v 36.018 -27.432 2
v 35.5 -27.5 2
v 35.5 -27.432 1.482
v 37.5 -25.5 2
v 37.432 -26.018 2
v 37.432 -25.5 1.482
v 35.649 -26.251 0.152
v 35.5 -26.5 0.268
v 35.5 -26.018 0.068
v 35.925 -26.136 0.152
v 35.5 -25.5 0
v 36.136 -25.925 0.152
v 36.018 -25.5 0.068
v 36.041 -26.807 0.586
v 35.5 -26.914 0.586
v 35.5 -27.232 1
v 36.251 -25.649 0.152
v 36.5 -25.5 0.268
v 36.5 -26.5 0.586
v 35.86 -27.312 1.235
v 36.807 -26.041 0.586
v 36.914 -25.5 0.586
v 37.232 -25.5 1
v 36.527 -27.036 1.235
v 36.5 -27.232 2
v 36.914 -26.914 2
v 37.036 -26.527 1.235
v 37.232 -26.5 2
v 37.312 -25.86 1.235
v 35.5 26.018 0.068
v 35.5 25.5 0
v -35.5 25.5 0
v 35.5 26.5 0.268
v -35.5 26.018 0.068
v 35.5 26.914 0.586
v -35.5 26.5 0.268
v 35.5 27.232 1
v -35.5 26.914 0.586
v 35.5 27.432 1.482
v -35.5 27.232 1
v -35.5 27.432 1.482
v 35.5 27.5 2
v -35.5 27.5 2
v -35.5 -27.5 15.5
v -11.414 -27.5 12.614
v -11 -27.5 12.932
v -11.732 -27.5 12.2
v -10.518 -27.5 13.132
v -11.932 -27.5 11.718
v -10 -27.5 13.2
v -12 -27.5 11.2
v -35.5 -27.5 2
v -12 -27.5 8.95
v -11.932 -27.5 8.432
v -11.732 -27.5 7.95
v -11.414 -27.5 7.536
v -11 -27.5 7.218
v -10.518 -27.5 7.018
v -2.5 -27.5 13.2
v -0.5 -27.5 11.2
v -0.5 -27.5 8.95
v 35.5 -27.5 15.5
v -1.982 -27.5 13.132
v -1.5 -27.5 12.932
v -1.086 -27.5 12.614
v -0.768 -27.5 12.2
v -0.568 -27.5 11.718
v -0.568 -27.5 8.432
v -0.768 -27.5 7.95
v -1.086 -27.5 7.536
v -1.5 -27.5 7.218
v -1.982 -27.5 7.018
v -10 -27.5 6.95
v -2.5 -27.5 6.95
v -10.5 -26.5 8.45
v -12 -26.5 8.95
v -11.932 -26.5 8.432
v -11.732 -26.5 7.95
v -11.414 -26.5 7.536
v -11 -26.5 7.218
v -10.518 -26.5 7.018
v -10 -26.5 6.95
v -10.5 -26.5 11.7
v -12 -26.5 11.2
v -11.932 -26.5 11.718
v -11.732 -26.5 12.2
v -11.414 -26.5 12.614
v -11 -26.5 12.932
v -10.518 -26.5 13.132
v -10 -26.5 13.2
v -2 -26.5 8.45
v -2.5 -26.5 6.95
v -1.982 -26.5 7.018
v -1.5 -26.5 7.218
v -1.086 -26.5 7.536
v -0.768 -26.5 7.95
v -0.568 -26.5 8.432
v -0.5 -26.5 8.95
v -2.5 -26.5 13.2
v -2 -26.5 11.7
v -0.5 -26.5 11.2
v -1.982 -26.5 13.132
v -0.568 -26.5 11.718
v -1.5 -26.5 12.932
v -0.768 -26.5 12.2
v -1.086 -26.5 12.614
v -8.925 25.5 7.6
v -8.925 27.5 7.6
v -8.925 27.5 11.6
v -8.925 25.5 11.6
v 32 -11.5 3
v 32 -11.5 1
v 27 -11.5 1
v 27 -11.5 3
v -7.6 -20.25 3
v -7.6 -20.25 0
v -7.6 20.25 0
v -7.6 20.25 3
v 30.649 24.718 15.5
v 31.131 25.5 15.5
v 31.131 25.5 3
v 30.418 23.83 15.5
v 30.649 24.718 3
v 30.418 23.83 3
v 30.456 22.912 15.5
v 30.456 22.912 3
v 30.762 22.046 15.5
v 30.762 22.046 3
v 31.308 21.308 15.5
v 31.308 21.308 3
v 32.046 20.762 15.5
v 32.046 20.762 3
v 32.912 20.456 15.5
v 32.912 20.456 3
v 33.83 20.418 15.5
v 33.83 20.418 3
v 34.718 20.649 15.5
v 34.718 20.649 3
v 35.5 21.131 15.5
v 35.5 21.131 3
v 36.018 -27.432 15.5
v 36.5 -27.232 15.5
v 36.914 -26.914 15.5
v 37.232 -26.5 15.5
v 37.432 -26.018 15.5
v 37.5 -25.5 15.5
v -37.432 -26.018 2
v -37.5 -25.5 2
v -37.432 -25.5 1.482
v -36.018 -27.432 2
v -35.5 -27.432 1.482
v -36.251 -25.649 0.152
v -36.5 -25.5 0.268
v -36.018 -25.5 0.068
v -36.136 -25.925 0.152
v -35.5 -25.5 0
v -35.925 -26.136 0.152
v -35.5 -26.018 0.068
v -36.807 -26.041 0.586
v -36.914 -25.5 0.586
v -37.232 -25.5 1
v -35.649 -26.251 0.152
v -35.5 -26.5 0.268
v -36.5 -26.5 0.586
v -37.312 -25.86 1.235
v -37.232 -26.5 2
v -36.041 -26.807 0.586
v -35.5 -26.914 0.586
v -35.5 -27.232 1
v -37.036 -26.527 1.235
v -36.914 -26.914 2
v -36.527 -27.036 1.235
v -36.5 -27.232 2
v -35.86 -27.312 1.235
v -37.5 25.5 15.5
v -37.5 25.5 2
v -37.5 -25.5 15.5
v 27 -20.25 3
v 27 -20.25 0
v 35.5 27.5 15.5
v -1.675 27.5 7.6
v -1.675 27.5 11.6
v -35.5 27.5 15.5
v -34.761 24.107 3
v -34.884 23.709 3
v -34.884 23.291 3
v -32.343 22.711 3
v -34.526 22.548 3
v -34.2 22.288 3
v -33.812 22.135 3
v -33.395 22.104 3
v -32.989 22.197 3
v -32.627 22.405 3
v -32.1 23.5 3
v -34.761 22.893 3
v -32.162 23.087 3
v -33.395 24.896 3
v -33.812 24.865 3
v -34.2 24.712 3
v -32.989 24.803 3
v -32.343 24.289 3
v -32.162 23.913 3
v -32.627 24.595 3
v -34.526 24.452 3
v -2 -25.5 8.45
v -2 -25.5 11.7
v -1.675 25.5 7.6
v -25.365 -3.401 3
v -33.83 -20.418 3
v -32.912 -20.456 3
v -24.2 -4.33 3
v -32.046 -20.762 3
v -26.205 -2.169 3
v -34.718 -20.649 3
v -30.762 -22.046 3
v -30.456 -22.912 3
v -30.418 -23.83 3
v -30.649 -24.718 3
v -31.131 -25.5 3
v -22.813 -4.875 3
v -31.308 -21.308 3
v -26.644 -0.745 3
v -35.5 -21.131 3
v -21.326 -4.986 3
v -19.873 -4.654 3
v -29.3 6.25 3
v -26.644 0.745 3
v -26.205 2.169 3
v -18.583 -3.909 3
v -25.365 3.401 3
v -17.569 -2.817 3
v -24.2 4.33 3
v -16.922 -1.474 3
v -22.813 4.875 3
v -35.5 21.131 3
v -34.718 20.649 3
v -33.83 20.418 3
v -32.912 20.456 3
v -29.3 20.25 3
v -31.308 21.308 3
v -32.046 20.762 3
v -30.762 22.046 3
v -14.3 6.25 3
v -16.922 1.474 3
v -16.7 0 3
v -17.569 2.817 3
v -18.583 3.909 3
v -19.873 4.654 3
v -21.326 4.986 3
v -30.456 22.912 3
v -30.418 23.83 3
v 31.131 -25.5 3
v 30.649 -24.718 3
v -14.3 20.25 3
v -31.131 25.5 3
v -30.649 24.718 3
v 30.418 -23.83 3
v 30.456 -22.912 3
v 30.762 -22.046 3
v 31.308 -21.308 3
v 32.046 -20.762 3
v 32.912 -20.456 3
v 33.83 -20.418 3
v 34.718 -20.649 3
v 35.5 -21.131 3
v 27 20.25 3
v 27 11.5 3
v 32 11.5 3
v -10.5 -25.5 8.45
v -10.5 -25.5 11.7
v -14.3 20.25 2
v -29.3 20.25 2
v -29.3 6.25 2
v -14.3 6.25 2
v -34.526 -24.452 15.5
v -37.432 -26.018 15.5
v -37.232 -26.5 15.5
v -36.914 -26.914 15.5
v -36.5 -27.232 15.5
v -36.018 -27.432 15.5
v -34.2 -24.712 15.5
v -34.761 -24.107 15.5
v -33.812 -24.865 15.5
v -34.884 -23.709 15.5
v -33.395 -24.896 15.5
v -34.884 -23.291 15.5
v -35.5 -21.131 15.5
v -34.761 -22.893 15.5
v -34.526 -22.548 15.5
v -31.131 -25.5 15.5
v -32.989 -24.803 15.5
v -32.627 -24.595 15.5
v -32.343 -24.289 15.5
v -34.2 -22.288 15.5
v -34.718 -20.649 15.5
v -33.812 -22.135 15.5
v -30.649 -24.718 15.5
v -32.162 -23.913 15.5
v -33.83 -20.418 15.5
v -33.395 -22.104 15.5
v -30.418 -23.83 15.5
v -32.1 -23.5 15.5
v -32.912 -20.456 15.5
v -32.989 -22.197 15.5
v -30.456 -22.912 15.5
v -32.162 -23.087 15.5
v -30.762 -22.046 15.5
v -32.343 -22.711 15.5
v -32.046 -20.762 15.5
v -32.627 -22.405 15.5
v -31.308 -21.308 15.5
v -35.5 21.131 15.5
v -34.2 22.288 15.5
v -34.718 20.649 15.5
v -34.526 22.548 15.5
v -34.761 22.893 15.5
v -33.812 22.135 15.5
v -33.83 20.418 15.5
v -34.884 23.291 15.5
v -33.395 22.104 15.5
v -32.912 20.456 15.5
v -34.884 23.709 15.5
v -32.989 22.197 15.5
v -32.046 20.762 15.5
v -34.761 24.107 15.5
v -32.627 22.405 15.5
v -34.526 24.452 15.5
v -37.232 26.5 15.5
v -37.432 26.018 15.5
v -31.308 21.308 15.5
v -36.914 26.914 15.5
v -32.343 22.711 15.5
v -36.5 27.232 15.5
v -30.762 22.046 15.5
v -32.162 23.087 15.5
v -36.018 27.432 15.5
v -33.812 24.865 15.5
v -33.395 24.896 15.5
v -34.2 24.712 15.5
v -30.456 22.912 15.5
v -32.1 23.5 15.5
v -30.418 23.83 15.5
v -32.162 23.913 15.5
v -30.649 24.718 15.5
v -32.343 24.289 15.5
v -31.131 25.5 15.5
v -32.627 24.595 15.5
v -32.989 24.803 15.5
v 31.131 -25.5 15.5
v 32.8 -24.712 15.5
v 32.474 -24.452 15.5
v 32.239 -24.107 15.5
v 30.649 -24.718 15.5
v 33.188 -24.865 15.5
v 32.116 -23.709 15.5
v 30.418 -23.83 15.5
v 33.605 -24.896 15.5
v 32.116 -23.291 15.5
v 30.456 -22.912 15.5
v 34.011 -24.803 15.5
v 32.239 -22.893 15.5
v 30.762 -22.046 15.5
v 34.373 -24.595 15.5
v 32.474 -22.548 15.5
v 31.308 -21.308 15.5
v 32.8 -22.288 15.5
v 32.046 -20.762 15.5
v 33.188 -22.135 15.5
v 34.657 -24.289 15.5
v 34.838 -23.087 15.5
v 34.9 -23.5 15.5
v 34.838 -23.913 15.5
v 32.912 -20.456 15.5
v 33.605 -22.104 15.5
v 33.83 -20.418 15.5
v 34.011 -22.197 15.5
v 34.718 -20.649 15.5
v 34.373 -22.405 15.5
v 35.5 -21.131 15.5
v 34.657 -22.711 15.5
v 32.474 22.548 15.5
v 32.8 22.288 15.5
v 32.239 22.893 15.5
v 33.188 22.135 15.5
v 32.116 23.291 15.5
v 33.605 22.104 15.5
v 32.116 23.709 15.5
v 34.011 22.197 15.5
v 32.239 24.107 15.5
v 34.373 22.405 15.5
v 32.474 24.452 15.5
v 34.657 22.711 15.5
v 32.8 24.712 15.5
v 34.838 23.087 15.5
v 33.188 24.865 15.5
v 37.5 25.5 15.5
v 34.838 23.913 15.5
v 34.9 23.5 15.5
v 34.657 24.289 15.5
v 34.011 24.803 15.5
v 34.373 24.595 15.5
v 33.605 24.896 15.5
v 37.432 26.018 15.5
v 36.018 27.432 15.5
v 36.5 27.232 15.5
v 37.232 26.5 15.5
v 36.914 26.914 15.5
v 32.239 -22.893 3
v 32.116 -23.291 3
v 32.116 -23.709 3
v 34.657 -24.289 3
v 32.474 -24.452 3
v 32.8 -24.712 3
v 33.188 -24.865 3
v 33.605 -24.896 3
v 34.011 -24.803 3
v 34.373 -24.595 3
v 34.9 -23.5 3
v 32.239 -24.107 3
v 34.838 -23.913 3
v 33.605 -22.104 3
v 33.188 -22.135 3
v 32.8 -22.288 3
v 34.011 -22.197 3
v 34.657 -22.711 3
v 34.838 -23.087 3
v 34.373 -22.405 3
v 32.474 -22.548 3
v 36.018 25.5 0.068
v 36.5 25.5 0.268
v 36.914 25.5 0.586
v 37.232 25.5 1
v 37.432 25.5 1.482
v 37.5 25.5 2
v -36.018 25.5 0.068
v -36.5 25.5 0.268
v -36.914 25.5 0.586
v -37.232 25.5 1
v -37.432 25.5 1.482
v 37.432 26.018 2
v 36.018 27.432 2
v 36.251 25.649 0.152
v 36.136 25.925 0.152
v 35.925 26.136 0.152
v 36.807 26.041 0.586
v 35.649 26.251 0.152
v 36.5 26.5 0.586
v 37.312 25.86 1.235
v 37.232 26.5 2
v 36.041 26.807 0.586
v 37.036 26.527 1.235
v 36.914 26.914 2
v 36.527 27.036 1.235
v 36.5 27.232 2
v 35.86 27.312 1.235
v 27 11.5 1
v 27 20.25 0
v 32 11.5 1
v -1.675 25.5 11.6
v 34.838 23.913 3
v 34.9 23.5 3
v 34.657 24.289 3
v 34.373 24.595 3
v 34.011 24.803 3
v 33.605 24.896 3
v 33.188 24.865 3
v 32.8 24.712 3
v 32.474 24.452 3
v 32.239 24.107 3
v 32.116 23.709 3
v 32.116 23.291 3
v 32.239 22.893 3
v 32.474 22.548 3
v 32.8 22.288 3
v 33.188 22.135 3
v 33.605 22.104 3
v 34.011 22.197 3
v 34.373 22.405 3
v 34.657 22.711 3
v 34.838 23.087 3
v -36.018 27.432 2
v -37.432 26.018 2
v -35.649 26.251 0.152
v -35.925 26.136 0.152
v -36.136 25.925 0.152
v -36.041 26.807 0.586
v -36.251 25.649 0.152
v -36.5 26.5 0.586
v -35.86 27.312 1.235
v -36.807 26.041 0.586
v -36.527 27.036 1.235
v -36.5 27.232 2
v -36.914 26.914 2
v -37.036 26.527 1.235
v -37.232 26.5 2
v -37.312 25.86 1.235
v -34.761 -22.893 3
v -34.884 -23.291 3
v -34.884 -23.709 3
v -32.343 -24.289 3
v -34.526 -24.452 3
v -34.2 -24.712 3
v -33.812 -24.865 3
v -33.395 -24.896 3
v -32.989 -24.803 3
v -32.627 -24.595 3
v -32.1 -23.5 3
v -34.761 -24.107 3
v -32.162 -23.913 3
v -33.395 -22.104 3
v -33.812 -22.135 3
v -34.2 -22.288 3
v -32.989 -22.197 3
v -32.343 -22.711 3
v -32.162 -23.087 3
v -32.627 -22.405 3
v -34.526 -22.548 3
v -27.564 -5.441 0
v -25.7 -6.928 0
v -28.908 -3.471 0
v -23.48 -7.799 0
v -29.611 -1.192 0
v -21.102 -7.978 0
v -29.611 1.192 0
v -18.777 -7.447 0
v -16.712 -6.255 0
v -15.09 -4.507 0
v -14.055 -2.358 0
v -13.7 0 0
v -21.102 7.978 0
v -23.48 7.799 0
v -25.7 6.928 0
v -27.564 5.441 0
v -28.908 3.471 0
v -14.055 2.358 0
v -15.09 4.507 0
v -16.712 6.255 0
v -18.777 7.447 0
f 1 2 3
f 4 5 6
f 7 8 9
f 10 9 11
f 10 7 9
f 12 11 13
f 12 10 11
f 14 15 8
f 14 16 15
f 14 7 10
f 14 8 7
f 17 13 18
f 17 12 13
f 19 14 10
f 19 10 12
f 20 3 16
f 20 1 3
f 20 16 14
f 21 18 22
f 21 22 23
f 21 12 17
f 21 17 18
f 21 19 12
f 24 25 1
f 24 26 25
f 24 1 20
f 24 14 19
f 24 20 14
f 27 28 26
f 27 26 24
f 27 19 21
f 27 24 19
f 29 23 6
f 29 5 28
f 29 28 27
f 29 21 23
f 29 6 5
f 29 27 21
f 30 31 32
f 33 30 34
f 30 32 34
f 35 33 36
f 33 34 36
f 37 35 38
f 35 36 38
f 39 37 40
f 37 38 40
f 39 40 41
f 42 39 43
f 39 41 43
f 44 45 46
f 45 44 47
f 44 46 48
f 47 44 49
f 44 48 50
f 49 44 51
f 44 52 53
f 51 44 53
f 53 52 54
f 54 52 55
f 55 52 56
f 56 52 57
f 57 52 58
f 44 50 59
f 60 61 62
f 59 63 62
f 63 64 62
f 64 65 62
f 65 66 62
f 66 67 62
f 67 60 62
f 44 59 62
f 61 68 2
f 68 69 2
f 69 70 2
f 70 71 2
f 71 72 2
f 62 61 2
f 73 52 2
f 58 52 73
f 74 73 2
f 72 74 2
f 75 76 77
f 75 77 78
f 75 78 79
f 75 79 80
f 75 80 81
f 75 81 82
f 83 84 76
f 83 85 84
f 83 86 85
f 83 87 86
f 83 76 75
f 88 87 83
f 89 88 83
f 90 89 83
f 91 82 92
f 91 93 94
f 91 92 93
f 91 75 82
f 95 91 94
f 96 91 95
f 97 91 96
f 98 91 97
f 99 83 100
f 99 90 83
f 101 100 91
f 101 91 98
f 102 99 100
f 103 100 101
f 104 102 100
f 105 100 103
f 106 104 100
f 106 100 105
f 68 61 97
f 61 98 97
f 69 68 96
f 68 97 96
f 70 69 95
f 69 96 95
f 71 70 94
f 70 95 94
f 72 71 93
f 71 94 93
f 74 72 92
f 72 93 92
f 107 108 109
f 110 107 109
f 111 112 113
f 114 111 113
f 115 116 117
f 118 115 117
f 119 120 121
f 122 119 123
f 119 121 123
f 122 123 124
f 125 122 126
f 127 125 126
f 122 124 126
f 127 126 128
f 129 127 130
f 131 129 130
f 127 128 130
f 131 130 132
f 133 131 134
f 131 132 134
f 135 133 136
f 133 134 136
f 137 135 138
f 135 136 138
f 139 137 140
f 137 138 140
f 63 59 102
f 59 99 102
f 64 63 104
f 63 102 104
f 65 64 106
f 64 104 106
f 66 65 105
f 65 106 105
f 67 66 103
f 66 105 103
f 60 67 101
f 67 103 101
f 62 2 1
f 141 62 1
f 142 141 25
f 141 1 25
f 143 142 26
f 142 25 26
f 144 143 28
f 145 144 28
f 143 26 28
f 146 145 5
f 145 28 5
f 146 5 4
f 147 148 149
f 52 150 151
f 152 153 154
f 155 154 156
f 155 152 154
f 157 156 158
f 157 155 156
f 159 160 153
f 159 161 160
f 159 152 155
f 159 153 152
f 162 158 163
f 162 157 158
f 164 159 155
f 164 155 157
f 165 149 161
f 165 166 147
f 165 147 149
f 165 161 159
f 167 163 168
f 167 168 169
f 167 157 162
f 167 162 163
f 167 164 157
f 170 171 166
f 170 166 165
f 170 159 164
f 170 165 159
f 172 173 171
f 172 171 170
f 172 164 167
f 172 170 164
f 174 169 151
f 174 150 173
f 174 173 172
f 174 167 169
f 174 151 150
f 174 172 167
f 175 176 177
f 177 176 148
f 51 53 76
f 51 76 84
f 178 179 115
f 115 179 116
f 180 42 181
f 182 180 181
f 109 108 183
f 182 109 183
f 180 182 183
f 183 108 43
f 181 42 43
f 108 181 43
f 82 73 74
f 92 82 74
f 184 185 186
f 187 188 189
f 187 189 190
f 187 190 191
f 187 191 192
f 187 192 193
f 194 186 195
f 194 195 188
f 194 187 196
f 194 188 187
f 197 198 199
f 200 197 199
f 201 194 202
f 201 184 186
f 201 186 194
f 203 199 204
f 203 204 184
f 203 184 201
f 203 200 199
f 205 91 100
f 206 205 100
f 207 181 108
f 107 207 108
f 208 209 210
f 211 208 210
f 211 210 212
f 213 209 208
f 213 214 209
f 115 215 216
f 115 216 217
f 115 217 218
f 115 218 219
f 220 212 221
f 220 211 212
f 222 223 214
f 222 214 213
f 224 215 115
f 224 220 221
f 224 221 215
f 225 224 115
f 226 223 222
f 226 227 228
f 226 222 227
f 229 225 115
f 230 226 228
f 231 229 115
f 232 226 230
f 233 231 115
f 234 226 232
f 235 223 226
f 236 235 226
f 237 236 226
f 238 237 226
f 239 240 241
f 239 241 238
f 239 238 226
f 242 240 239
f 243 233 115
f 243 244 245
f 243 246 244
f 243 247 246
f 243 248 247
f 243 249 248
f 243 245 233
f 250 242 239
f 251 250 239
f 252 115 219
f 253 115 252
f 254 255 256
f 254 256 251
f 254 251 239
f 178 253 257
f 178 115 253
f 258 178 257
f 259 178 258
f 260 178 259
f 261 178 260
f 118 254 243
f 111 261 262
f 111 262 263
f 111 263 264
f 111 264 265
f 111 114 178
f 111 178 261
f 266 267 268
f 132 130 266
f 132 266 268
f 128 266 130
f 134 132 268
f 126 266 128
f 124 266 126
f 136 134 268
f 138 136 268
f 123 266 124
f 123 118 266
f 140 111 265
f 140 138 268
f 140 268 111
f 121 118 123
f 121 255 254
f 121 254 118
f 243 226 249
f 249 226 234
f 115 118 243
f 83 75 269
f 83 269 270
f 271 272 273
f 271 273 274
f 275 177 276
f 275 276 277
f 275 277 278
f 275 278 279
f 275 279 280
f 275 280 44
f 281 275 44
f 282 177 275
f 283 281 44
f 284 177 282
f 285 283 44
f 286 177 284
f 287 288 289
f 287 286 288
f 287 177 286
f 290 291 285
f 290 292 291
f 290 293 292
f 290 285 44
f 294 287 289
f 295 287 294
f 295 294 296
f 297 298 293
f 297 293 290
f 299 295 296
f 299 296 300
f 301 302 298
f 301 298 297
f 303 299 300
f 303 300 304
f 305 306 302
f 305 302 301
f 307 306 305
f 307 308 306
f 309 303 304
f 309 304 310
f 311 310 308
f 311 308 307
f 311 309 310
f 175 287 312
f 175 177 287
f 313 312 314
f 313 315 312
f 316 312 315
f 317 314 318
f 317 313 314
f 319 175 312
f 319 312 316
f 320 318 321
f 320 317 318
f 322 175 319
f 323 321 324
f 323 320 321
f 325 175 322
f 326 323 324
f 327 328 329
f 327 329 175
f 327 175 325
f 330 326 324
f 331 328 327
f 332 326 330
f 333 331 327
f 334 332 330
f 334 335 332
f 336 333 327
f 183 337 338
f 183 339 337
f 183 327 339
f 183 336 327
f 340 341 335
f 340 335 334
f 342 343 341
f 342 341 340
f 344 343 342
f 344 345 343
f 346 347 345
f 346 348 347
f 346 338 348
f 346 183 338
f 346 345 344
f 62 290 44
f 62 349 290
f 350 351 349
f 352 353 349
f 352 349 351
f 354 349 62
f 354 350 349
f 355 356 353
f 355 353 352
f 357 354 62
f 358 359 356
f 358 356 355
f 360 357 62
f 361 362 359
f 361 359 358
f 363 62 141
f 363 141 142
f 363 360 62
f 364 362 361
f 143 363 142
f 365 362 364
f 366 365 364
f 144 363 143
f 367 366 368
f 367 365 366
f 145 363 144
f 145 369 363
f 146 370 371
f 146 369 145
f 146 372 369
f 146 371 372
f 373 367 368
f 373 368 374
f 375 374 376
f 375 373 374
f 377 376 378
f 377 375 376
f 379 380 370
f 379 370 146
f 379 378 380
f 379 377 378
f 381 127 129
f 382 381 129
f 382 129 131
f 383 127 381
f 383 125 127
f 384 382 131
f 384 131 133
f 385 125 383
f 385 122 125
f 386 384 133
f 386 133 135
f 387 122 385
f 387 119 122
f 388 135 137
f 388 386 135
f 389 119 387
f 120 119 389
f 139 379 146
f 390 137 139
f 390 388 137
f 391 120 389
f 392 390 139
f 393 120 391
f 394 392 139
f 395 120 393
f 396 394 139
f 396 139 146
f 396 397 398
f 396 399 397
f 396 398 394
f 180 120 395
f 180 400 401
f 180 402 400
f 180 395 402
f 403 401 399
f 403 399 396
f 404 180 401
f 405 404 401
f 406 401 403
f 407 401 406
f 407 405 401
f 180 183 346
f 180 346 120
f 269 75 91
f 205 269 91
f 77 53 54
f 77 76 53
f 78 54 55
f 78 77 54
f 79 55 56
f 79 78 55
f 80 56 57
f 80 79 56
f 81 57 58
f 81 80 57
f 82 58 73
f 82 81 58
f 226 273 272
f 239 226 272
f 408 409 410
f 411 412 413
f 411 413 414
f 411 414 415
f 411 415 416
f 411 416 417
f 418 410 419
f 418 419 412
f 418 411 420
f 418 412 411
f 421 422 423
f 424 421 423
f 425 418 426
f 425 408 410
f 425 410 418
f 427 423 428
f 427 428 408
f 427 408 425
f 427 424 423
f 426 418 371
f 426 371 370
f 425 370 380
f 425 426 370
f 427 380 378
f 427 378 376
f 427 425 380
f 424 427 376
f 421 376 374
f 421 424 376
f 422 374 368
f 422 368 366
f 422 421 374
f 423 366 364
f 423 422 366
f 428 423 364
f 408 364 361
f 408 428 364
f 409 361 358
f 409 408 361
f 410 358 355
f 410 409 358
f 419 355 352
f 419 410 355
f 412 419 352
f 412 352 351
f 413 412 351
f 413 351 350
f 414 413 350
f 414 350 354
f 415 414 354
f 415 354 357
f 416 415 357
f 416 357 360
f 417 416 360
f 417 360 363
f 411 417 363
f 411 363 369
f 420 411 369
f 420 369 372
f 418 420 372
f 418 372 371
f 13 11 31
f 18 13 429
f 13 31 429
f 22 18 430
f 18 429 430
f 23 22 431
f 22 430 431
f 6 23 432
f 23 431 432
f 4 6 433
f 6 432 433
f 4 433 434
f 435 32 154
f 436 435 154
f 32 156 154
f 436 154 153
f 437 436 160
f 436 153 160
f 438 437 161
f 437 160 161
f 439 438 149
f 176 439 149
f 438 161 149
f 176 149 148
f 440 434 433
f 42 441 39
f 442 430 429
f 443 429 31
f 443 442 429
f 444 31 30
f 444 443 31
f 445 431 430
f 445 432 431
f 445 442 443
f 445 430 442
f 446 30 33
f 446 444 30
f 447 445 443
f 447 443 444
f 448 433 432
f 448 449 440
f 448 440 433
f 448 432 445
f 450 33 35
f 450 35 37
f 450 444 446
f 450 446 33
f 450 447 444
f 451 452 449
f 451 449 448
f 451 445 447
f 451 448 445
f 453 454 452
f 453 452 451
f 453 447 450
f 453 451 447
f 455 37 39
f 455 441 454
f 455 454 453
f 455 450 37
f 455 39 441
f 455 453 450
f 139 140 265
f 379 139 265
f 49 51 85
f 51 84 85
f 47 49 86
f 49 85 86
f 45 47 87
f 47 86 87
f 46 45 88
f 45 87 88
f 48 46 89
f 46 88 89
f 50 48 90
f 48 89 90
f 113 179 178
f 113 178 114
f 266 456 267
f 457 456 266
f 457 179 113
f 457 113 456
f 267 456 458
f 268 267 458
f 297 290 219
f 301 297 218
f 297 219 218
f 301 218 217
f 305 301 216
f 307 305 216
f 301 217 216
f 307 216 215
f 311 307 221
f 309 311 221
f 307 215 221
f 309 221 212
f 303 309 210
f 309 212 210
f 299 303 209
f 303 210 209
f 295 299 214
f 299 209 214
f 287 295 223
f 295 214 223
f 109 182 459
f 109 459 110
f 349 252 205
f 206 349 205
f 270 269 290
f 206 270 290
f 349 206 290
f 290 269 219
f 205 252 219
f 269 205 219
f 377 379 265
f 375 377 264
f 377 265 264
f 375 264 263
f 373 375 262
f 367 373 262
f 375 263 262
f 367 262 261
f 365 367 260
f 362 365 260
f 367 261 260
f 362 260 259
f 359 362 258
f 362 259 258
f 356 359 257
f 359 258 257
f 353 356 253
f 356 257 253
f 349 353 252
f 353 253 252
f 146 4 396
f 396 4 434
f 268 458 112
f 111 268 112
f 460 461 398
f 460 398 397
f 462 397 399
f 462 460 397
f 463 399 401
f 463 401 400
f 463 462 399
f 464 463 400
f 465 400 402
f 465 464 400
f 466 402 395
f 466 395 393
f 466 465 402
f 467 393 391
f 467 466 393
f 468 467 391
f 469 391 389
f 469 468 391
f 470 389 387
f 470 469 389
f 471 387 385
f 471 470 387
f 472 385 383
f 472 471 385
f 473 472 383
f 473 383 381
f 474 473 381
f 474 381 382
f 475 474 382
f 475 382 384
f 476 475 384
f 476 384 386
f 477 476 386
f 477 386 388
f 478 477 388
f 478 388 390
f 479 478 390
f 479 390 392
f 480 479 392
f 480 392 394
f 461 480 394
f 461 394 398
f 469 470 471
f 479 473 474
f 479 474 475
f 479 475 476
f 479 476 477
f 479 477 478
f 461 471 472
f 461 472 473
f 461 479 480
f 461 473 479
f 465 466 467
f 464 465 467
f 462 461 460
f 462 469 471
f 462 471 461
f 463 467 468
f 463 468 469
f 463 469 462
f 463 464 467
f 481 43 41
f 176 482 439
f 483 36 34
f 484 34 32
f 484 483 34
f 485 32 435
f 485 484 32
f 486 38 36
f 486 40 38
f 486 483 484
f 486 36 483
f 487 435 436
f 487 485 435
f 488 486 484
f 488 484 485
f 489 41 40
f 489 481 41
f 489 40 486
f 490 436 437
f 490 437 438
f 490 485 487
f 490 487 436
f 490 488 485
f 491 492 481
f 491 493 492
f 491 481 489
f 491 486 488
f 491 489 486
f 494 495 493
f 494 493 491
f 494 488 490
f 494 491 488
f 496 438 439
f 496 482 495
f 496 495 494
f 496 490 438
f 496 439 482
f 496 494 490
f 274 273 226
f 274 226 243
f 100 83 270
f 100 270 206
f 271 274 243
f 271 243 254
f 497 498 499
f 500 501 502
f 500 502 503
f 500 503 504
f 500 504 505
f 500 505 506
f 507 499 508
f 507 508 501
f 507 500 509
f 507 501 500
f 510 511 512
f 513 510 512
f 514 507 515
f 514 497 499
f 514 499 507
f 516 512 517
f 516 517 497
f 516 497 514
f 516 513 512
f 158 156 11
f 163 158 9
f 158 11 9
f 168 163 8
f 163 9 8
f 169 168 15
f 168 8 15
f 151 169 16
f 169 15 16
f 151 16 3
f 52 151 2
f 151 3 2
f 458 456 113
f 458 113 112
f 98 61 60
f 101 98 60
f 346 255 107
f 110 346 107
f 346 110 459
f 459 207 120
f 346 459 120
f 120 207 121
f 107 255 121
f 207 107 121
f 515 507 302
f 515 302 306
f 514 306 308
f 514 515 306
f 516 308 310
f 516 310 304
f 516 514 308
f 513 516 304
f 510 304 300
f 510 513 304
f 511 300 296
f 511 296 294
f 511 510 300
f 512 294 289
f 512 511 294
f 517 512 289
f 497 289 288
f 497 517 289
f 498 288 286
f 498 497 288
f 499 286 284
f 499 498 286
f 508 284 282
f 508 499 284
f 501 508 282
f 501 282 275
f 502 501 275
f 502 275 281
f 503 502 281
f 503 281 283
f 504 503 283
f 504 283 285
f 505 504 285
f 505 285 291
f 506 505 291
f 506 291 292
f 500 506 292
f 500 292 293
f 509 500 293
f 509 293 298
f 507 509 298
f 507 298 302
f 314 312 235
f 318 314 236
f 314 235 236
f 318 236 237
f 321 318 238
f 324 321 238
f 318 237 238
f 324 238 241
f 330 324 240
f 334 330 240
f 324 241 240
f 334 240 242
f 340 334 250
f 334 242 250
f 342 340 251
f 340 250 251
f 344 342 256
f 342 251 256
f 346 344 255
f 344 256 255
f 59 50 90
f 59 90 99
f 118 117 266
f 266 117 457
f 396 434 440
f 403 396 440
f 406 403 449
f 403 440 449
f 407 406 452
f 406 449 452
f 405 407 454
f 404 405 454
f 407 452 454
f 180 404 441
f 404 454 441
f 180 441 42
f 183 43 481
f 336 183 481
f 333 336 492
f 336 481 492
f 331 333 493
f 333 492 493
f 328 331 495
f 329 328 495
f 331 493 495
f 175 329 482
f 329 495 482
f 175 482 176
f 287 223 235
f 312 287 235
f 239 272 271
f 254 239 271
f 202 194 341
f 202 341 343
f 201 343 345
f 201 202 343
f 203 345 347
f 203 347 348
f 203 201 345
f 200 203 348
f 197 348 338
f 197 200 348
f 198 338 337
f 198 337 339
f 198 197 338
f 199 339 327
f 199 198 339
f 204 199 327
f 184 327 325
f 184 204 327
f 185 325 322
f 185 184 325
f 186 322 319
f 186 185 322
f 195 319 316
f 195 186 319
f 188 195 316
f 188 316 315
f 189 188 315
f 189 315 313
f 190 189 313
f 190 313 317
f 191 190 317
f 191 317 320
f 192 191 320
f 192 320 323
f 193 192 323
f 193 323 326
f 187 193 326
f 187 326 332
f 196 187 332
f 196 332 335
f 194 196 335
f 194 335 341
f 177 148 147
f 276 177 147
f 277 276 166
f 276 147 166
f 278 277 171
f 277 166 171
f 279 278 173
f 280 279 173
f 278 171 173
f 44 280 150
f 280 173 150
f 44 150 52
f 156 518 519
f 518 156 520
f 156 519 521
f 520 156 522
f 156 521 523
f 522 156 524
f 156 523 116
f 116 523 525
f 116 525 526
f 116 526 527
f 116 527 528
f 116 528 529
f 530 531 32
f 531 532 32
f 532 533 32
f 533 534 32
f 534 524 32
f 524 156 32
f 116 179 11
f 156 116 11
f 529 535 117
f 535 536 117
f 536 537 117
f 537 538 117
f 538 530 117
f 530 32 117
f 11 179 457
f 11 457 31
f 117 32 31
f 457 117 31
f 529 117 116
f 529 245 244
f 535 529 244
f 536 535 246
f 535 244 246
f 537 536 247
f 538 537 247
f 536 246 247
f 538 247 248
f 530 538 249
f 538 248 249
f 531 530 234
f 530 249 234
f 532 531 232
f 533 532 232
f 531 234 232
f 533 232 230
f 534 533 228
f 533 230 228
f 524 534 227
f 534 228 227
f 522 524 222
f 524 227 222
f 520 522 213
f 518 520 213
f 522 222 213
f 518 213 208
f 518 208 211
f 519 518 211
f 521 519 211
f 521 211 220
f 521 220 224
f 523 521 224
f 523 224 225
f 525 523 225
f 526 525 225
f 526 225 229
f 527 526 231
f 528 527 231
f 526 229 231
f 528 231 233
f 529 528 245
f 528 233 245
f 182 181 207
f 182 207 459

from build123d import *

# Parameters (mm, degrees)
F0_R      = 5
F0_W      = 15
F0_H      = 14
F1_DEPTH  = 3
F0_W_2    = 5
F0_H_2    = 23
F2_DEPTH  = 1
F0_R_2    = 1.4
F3_DEPTH  = 15.5
F4_DEPTH  = 3
F5_R      = 2
F6_W      = 7.25
F6_H      = 4
F7_DEPTH  = 25
F8_W      = 8.5
F8_H      = 3.25
F9_DEPTH  = 25
F8_W_2    = 11.5
F8_H_2    = 6.25
F10_DEPTH = 1
F11_R     = 2
F12_DEPTH = 2
F13_SIZE  = 2.99999


# Not quite as in the source:
# - a fillet or chamfer is up to 0.001 mm smaller than in the source, because OpenCascade refuses the exact size
# - a feature names something its author has since deleted; it is built from what else it names


with BuildPart() as f1:
    # F0 (on Top) → F1 (new body)
    with BuildSketch(Plane.XY):
        with BuildLine():
            ThreePointArc((35.5, 21.1314561435), (31.3079689783, 21.3079689783), (31.1314561435, 25.5))
            Line((31.1314561435, 25.5), (-31.1314561435, 25.5))
            ThreePointArc((-31.1314561435, 25.5), (-31.3079689783, 21.3079689783), (-35.5, 21.1314561435))
            Line((-35.5, 21.1314561435), (-35.5, -21.1314561435))
            ThreePointArc((-35.5, -21.1314561435), (-31.3079689783, -21.3079689783), (-31.1314561435, -25.5))
            Line((-31.1314561435, -25.5), (31.1314561435, -25.5))
            ThreePointArc((31.1314561435, -25.5), (31.3079689783, -21.3079689783), (35.5, -21.1314561435))
            Line((35.5, -21.1314561435), (35.5, 21.1314561435))
        make_face()
        with Locations((-21.7, 0)):
            Circle(F0_R, mode=Mode.SUBTRACT)
        with Locations((-21.8, 13.25)):
            Rectangle(F0_W, F0_H, mode=Mode.SUBTRACT)
        Polygon((-7.6, -20.25), (-7.6, 20.25), (27, 20.25), (27, 11.5), (32, 11.5), (32, -11.5), (27, -11.5), (27, -20.25), align=None, mode=Mode.SUBTRACT)
    extrude(amount=F1_DEPTH)

    # F0 (on Top) → F2 (join)
    with BuildSketch(Plane.XY):
        with Locations((29.5, 0)):
            Rectangle(F0_W_2, F0_H_2)
    extrude(amount=F2_DEPTH)

    # F0 (on Top) → F3 (join)
    with BuildSketch(Plane.XY):
        with BuildLine():
            ThreePointArc((37.5, 25.5), (36.9142135624, 26.9142135624), (35.5, 27.5))
            Line((35.5, 27.5), (-35.5, 27.5))
            ThreePointArc((-35.5, 27.5), (-36.9142135624, 26.9142135624), (-37.5, 25.5))
            Line((-37.5, 25.5), (-37.5, -25.5))
            ThreePointArc((-37.5, -25.5), (-36.9142135624, -26.9142135624), (-35.5, -27.5))
            Line((-35.5, -27.5), (35.5, -27.5))
            ThreePointArc((35.5, -27.5), (36.9142135624, -26.9142135624), (37.5, -25.5))
            Line((37.5, -25.5), (37.5, 25.5))
        make_face()
        Polygon((31.1314561435, 25.5), (35.5, 25.5), (35.5, 21.1314561435), (35.5, -21.1314561435), (35.5, -25.5), (31.1314561435, -25.5), (-31.1314561435, -25.5), (-35.5, -25.5), (-35.5, -21.1314561435), (-35.5, 21.1314561435), (-35.5, 25.5), (-31.1314561435, 25.5), align=None, mode=Mode.SUBTRACT)
        with BuildLine():
            ThreePointArc((-35.5, 21.1314561435), (-31.3079689783, 21.3079689783), (-31.1314561435, 25.5))
            Line((-31.1314561435, 25.5), (-35.5, 25.5))
            Line((-35.5, 25.5), (-35.5, 21.1314561435))
        make_face()
        with Locations((-33.5, 23.5)):
            Circle(F0_R_2, mode=Mode.SUBTRACT)
        with BuildLine():
            ThreePointArc((-31.1314561435, -25.5), (-31.3079689783, -21.3079689783), (-35.5, -21.1314561435))
            Line((-35.5, -21.1314561435), (-35.5, -25.5))
            Line((-35.5, -25.5), (-31.1314561435, -25.5))
        make_face()
        with Locations((-33.5, -23.5)):
            Circle(F0_R_2, mode=Mode.SUBTRACT)
        with BuildLine():
            Line((35.5, -25.5), (35.5, -21.1314561435))
            ThreePointArc((35.5, -21.1314561435), (31.3079689783, -21.3079689783), (31.1314561435, -25.5))
            Line((31.1314561435, -25.5), (35.5, -25.5))
        make_face()
        with Locations((33.5, -23.5)):
            Circle(F0_R_2, mode=Mode.SUBTRACT)
        with BuildLine():
            Line((35.5, 21.1314561435), (35.5, 25.5))
            Line((35.5, 25.5), (31.1314561435, 25.5))
            ThreePointArc((31.1314561435, 25.5), (31.3079689783, 21.3079689783), (35.5, 21.1314561435))
        make_face()
        with Locations((33.5, 23.5)):
            Circle(F0_R_2, mode=Mode.SUBTRACT)
    extrude(amount=F3_DEPTH)

    # F0 (on Top) → F4 (join)
    with BuildSketch(Plane.XY):
        with Locations((33.5, -23.5)):
            Circle(F0_R_2)
        with Locations((33.5, 23.5)):
            Circle(F0_R_2)
        with Locations((-33.5, 23.5)):
            Circle(F0_R_2)
        with Locations((-33.5, -23.5)):
            Circle(F0_R_2)
    extrude(amount=F4_DEPTH)

    # F5
    f5_edges = [f1.edges().sort_by_distance(p)[0] for p in [
        (-37.5, 0, 0),
    ]]
    fillet(f5_edges, radius=F5_R)

    # F6 (on face) → F7 (cut)
    with BuildSketch(Plane(origin=(0, 27.5, 0), x_dir=(-1, 0, 0), z_dir=(0, 1, 0))):
        with Locations((5.3, 9.6)):
            Rectangle(F6_W, F6_H)
    extrude(amount=-F7_DEPTH, mode=Mode.SUBTRACT)

    # F8 (on face) → F9 (cut)
    with BuildSketch(Plane.XZ.offset(27.5)):
        with Locations((-6.25, 10.075)):
            Rectangle(F8_W, F8_H)
    extrude(amount=-F9_DEPTH, mode=Mode.SUBTRACT)

    # F8 (on face) → F10 (cut)
    with BuildSketch(Plane.XZ.offset(27.5)):
        with Locations((-6.25, 10.075)):
            Rectangle(F8_W_2, F8_H_2)
        with Locations((-6.25, 10.075)):
            Rectangle(F8_W, F8_H, mode=Mode.SUBTRACT)
    extrude(amount=-F10_DEPTH, mode=Mode.SUBTRACT)

    # F11
    f11_edges = [f1.edges().sort_by_distance(p)[0] for p in [
        (-0.5, -27, 13.2),
        (-0.5, -27, 6.95),
        (-12, -27, 6.95),
        (-12, -27, 13.2),
    ]]
    fillet(f11_edges, radius=F11_R)

    # F0 (on Top) → F12 (join)
    with BuildSketch(Plane.XY):
        with Locations((-21.8, 13.25)):
            Rectangle(F0_W, F0_H)
    extrude(amount=F12_DEPTH)

    # F13 (size 3 in the source; OpenCascade refuses exactly that, so slightly less here)
    f13_edges = [f1.edges().sort_by_distance(p)[0] for p in [
        (-26.7, 0, 0),
    ]]
    chamfer(f13_edges, length=F13_SIZE)


solid = f1.part
